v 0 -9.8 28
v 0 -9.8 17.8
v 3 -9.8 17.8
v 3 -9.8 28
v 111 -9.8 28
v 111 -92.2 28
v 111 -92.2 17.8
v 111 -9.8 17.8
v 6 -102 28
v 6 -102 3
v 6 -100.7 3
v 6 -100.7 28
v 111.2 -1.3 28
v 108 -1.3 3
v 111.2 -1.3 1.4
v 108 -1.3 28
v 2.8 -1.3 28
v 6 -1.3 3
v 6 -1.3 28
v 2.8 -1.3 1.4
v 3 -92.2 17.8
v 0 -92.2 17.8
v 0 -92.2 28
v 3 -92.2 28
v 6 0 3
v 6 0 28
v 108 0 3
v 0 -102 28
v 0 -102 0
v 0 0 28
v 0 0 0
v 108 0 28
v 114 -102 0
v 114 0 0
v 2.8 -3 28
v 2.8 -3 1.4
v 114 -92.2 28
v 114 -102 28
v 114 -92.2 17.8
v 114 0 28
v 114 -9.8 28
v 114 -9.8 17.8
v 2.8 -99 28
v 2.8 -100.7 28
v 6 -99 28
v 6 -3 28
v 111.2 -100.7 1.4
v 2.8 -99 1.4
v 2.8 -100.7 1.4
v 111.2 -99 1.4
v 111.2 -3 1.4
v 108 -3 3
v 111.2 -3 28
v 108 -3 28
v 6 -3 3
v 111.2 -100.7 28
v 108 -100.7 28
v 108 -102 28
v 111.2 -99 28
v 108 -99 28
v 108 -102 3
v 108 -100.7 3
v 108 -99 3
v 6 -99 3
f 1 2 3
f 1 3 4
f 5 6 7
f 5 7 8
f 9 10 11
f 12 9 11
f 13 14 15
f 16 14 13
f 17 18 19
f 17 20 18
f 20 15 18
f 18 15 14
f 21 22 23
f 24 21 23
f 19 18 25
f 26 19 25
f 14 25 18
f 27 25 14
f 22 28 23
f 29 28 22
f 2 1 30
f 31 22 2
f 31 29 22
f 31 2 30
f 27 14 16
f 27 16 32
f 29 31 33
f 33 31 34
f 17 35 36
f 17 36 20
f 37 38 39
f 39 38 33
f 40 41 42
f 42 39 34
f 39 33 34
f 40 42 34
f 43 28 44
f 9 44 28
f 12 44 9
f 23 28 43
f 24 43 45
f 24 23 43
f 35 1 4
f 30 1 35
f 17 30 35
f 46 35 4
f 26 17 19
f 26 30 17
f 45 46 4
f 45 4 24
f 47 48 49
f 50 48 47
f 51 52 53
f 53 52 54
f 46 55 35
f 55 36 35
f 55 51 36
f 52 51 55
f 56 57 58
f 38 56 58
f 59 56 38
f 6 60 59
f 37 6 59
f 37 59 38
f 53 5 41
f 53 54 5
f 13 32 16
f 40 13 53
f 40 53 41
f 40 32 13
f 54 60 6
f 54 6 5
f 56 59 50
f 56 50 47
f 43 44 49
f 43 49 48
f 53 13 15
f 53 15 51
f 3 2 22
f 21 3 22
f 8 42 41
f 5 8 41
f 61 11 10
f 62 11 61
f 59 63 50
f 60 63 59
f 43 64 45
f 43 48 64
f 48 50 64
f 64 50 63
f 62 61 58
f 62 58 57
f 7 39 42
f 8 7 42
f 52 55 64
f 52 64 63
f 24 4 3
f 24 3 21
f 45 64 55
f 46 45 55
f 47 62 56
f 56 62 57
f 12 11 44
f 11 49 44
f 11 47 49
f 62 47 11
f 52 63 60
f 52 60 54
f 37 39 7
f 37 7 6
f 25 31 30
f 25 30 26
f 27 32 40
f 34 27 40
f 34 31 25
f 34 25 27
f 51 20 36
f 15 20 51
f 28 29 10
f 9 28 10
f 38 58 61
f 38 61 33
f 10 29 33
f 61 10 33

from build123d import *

# Parameters (mm, degrees)
SKETCH_W        = 114
SKETCH_H        = 102
PAD_DEPTH       = 3
SKETCH001_W     = 6
SKETCH001_H     = 102
PAD001_DEPTH    = 25
SKETCH002_W     = 6
SKETCH002_H     = 102
PAD002_DEPTH    = 25
SKETCH003_W     = 82.4
SKETCH003_H     = 10.2
POCKET_DEPTH    = 3
SKETCH004_W     = 82.4
SKETCH004_H     = 10.2
POCKET001_DEPTH = 3
SKETCH005_W     = 1.7
SKETCH005_H     = 25
POCKET002_DEPTH = 3.2
SKETCH006_W     = 102
SKETCH006_H     = 1.7
POCKET003_DEPTH = 1.6
SKETCH007_W     = 3.2
SKETCH007_H     = 1.7
POCKET004_DEPTH = 1.6
SKETCH008_W     = 1.7
SKETCH008_H     = 25
POCKET005_DEPTH = 3.2
SKETCH010_W     = 3.2
SKETCH010_H     = 1.7
POCKET006_DEPTH = 1.6
SKETCH011_W     = 1.7
SKETCH011_H     = 25
POCKET007_DEPTH = 3.2
SKETCH012_W     = 102
SKETCH012_H     = 1.7
POCKET008_DEPTH = 1.6
SKETCH013_W     = 3.2
SKETCH013_H     = 1.7
POCKET009_DEPTH = 1.6
SKETCH014_W     = 1.7
SKETCH014_H     = 25
POCKET010_DEPTH = 3.2
SKETCH015_W     = 3.2
SKETCH015_H     = 1.7
POCKET011_DEPTH = 1.6


with BuildPart() as part:
    # Sketch → Pad (new body)
    with BuildSketch(Plane.XY):
        with Locations((57, -51)):
            Rectangle(SKETCH_W, SKETCH_H)
    extrude(amount=PAD_DEPTH)

    # Sketch001 (on Face6 of Pad) → Pad001 (join)
    with BuildSketch(Plane.XY.offset(3)):
        with Locations((3, -51)):
            Rectangle(SKETCH001_W, SKETCH001_H)
    extrude(amount=PAD001_DEPTH)

    # Sketch002 (on Face6 of Pad001) → Pad002 (join)
    with BuildSketch(Plane.XY.offset(3)):
        with Locations((111, -51)):
            Rectangle(SKETCH002_W, SKETCH002_H)
    extrude(amount=PAD002_DEPTH)

    # Sketch003 (on Face10 of Pad002) → Pocket (cut)
    with BuildSketch(Plane.YZ.offset(114)):
        with Locations((-51, 22.9)):
            Rectangle(SKETCH003_W, SKETCH003_H)
    extrude(amount=-POCKET_DEPTH, mode=Mode.SUBTRACT)

    # Sketch004 (on Face9 of Pocket) → Pocket001 (cut)
    with BuildSketch(Plane(origin=(0, 0, 0), x_dir=(0, -1, 0), z_dir=(-1, 0, 0))):
        with Locations((51, 22.9)):
            Rectangle(SKETCH004_W, SKETCH004_H)
    extrude(amount=-POCKET001_DEPTH, mode=Mode.SUBTRACT)

    # Sketch005 (on Face11 of Pocket001) → Pocket002 (cut)
    with BuildSketch(Plane.YZ.offset(6)):
        with Locations((-99.85, 15.5)):
            Rectangle(SKETCH005_W, SKETCH005_H)
    extrude(amount=-POCKET002_DEPTH, mode=Mode.SUBTRACT)

    # Sketch006 (on Face6 of Pocket002) → Pocket003 (cut)
    with BuildSketch(Plane.XY.offset(3)):
        with Locations((57, -99.85)):
            Rectangle(SKETCH006_W, SKETCH006_H)
    extrude(amount=-POCKET003_DEPTH, mode=Mode.SUBTRACT)

    # Sketch007 (on Face35 of Pocket003) → Pocket004 (cut)
    with BuildSketch(Plane.XY.offset(3)):
        with Locations((4.4, -99.85)):
            Rectangle(SKETCH007_W, SKETCH007_H)
    extrude(amount=-POCKET004_DEPTH, mode=Mode.SUBTRACT)

    # Sketch008 (on Face13 of Pocket004) → Pocket005 (cut)
    with BuildSketch(Plane(origin=(108, 0, 0), x_dir=(0, -1, 0), z_dir=(-1, 0, 0))):
        with Locations((99.85, 15.5)):
            Rectangle(SKETCH008_W, SKETCH008_H)
    extrude(amount=-POCKET005_DEPTH, mode=Mode.SUBTRACT)

    # Sketch010 (on Face41 of Pocket005) → Pocket006 (cut)
    with BuildSketch(Plane.XY.offset(3)):
        with Locations((109.6, -99.85)):
            Rectangle(SKETCH010_W, SKETCH010_H)
    extrude(amount=-POCKET006_DEPTH, mode=Mode.SUBTRACT)

    # Sketch011 (on Face11 of Pocket006) → Pocket007 (cut)
    with BuildSketch(Plane.YZ.offset(6)):
        with Locations((-2.15, 15.5)):
            Rectangle(SKETCH011_W, SKETCH011_H)
    extrude(amount=-POCKET007_DEPTH, mode=Mode.SUBTRACT)

    # Sketch012 (on Face6 of Pocket007) → Pocket008 (cut)
    with BuildSketch(Plane.XY.offset(3)):
        with Locations((57, -2.15)):
            Rectangle(SKETCH012_W, SKETCH012_H)
    extrude(amount=-POCKET008_DEPTH, mode=Mode.SUBTRACT)

    # Sketch013 (on Face44 of Pocket008) → Pocket009 (cut)
    with BuildSketch(Plane.XY.offset(3)):
        with Locations((4.4, -2.15)):
            Rectangle(SKETCH013_W, SKETCH013_H)
    extrude(amount=-POCKET009_DEPTH, mode=Mode.SUBTRACT)

    # Sketch014 (on Face13 of Pocket009) → Pocket010 (cut)
    with BuildSketch(Plane(origin=(108, 0, 0), x_dir=(0, -1, 0), z_dir=(-1, 0, 0))):
        with Locations((2.15, 15.5)):
            Rectangle(SKETCH014_W, SKETCH014_H)
    extrude(amount=-POCKET010_DEPTH, mode=Mode.SUBTRACT)

    # Sketch015 (on Face53 of Pocket010) → Pocket011 (cut)
    with BuildSketch(Plane.XY.offset(3)):
        with Locations((109.6, -2.15)):
            Rectangle(SKETCH015_W, SKETCH015_H)
    extrude(amount=-POCKET011_DEPTH, mode=Mode.SUBTRACT)


solid = part.part
